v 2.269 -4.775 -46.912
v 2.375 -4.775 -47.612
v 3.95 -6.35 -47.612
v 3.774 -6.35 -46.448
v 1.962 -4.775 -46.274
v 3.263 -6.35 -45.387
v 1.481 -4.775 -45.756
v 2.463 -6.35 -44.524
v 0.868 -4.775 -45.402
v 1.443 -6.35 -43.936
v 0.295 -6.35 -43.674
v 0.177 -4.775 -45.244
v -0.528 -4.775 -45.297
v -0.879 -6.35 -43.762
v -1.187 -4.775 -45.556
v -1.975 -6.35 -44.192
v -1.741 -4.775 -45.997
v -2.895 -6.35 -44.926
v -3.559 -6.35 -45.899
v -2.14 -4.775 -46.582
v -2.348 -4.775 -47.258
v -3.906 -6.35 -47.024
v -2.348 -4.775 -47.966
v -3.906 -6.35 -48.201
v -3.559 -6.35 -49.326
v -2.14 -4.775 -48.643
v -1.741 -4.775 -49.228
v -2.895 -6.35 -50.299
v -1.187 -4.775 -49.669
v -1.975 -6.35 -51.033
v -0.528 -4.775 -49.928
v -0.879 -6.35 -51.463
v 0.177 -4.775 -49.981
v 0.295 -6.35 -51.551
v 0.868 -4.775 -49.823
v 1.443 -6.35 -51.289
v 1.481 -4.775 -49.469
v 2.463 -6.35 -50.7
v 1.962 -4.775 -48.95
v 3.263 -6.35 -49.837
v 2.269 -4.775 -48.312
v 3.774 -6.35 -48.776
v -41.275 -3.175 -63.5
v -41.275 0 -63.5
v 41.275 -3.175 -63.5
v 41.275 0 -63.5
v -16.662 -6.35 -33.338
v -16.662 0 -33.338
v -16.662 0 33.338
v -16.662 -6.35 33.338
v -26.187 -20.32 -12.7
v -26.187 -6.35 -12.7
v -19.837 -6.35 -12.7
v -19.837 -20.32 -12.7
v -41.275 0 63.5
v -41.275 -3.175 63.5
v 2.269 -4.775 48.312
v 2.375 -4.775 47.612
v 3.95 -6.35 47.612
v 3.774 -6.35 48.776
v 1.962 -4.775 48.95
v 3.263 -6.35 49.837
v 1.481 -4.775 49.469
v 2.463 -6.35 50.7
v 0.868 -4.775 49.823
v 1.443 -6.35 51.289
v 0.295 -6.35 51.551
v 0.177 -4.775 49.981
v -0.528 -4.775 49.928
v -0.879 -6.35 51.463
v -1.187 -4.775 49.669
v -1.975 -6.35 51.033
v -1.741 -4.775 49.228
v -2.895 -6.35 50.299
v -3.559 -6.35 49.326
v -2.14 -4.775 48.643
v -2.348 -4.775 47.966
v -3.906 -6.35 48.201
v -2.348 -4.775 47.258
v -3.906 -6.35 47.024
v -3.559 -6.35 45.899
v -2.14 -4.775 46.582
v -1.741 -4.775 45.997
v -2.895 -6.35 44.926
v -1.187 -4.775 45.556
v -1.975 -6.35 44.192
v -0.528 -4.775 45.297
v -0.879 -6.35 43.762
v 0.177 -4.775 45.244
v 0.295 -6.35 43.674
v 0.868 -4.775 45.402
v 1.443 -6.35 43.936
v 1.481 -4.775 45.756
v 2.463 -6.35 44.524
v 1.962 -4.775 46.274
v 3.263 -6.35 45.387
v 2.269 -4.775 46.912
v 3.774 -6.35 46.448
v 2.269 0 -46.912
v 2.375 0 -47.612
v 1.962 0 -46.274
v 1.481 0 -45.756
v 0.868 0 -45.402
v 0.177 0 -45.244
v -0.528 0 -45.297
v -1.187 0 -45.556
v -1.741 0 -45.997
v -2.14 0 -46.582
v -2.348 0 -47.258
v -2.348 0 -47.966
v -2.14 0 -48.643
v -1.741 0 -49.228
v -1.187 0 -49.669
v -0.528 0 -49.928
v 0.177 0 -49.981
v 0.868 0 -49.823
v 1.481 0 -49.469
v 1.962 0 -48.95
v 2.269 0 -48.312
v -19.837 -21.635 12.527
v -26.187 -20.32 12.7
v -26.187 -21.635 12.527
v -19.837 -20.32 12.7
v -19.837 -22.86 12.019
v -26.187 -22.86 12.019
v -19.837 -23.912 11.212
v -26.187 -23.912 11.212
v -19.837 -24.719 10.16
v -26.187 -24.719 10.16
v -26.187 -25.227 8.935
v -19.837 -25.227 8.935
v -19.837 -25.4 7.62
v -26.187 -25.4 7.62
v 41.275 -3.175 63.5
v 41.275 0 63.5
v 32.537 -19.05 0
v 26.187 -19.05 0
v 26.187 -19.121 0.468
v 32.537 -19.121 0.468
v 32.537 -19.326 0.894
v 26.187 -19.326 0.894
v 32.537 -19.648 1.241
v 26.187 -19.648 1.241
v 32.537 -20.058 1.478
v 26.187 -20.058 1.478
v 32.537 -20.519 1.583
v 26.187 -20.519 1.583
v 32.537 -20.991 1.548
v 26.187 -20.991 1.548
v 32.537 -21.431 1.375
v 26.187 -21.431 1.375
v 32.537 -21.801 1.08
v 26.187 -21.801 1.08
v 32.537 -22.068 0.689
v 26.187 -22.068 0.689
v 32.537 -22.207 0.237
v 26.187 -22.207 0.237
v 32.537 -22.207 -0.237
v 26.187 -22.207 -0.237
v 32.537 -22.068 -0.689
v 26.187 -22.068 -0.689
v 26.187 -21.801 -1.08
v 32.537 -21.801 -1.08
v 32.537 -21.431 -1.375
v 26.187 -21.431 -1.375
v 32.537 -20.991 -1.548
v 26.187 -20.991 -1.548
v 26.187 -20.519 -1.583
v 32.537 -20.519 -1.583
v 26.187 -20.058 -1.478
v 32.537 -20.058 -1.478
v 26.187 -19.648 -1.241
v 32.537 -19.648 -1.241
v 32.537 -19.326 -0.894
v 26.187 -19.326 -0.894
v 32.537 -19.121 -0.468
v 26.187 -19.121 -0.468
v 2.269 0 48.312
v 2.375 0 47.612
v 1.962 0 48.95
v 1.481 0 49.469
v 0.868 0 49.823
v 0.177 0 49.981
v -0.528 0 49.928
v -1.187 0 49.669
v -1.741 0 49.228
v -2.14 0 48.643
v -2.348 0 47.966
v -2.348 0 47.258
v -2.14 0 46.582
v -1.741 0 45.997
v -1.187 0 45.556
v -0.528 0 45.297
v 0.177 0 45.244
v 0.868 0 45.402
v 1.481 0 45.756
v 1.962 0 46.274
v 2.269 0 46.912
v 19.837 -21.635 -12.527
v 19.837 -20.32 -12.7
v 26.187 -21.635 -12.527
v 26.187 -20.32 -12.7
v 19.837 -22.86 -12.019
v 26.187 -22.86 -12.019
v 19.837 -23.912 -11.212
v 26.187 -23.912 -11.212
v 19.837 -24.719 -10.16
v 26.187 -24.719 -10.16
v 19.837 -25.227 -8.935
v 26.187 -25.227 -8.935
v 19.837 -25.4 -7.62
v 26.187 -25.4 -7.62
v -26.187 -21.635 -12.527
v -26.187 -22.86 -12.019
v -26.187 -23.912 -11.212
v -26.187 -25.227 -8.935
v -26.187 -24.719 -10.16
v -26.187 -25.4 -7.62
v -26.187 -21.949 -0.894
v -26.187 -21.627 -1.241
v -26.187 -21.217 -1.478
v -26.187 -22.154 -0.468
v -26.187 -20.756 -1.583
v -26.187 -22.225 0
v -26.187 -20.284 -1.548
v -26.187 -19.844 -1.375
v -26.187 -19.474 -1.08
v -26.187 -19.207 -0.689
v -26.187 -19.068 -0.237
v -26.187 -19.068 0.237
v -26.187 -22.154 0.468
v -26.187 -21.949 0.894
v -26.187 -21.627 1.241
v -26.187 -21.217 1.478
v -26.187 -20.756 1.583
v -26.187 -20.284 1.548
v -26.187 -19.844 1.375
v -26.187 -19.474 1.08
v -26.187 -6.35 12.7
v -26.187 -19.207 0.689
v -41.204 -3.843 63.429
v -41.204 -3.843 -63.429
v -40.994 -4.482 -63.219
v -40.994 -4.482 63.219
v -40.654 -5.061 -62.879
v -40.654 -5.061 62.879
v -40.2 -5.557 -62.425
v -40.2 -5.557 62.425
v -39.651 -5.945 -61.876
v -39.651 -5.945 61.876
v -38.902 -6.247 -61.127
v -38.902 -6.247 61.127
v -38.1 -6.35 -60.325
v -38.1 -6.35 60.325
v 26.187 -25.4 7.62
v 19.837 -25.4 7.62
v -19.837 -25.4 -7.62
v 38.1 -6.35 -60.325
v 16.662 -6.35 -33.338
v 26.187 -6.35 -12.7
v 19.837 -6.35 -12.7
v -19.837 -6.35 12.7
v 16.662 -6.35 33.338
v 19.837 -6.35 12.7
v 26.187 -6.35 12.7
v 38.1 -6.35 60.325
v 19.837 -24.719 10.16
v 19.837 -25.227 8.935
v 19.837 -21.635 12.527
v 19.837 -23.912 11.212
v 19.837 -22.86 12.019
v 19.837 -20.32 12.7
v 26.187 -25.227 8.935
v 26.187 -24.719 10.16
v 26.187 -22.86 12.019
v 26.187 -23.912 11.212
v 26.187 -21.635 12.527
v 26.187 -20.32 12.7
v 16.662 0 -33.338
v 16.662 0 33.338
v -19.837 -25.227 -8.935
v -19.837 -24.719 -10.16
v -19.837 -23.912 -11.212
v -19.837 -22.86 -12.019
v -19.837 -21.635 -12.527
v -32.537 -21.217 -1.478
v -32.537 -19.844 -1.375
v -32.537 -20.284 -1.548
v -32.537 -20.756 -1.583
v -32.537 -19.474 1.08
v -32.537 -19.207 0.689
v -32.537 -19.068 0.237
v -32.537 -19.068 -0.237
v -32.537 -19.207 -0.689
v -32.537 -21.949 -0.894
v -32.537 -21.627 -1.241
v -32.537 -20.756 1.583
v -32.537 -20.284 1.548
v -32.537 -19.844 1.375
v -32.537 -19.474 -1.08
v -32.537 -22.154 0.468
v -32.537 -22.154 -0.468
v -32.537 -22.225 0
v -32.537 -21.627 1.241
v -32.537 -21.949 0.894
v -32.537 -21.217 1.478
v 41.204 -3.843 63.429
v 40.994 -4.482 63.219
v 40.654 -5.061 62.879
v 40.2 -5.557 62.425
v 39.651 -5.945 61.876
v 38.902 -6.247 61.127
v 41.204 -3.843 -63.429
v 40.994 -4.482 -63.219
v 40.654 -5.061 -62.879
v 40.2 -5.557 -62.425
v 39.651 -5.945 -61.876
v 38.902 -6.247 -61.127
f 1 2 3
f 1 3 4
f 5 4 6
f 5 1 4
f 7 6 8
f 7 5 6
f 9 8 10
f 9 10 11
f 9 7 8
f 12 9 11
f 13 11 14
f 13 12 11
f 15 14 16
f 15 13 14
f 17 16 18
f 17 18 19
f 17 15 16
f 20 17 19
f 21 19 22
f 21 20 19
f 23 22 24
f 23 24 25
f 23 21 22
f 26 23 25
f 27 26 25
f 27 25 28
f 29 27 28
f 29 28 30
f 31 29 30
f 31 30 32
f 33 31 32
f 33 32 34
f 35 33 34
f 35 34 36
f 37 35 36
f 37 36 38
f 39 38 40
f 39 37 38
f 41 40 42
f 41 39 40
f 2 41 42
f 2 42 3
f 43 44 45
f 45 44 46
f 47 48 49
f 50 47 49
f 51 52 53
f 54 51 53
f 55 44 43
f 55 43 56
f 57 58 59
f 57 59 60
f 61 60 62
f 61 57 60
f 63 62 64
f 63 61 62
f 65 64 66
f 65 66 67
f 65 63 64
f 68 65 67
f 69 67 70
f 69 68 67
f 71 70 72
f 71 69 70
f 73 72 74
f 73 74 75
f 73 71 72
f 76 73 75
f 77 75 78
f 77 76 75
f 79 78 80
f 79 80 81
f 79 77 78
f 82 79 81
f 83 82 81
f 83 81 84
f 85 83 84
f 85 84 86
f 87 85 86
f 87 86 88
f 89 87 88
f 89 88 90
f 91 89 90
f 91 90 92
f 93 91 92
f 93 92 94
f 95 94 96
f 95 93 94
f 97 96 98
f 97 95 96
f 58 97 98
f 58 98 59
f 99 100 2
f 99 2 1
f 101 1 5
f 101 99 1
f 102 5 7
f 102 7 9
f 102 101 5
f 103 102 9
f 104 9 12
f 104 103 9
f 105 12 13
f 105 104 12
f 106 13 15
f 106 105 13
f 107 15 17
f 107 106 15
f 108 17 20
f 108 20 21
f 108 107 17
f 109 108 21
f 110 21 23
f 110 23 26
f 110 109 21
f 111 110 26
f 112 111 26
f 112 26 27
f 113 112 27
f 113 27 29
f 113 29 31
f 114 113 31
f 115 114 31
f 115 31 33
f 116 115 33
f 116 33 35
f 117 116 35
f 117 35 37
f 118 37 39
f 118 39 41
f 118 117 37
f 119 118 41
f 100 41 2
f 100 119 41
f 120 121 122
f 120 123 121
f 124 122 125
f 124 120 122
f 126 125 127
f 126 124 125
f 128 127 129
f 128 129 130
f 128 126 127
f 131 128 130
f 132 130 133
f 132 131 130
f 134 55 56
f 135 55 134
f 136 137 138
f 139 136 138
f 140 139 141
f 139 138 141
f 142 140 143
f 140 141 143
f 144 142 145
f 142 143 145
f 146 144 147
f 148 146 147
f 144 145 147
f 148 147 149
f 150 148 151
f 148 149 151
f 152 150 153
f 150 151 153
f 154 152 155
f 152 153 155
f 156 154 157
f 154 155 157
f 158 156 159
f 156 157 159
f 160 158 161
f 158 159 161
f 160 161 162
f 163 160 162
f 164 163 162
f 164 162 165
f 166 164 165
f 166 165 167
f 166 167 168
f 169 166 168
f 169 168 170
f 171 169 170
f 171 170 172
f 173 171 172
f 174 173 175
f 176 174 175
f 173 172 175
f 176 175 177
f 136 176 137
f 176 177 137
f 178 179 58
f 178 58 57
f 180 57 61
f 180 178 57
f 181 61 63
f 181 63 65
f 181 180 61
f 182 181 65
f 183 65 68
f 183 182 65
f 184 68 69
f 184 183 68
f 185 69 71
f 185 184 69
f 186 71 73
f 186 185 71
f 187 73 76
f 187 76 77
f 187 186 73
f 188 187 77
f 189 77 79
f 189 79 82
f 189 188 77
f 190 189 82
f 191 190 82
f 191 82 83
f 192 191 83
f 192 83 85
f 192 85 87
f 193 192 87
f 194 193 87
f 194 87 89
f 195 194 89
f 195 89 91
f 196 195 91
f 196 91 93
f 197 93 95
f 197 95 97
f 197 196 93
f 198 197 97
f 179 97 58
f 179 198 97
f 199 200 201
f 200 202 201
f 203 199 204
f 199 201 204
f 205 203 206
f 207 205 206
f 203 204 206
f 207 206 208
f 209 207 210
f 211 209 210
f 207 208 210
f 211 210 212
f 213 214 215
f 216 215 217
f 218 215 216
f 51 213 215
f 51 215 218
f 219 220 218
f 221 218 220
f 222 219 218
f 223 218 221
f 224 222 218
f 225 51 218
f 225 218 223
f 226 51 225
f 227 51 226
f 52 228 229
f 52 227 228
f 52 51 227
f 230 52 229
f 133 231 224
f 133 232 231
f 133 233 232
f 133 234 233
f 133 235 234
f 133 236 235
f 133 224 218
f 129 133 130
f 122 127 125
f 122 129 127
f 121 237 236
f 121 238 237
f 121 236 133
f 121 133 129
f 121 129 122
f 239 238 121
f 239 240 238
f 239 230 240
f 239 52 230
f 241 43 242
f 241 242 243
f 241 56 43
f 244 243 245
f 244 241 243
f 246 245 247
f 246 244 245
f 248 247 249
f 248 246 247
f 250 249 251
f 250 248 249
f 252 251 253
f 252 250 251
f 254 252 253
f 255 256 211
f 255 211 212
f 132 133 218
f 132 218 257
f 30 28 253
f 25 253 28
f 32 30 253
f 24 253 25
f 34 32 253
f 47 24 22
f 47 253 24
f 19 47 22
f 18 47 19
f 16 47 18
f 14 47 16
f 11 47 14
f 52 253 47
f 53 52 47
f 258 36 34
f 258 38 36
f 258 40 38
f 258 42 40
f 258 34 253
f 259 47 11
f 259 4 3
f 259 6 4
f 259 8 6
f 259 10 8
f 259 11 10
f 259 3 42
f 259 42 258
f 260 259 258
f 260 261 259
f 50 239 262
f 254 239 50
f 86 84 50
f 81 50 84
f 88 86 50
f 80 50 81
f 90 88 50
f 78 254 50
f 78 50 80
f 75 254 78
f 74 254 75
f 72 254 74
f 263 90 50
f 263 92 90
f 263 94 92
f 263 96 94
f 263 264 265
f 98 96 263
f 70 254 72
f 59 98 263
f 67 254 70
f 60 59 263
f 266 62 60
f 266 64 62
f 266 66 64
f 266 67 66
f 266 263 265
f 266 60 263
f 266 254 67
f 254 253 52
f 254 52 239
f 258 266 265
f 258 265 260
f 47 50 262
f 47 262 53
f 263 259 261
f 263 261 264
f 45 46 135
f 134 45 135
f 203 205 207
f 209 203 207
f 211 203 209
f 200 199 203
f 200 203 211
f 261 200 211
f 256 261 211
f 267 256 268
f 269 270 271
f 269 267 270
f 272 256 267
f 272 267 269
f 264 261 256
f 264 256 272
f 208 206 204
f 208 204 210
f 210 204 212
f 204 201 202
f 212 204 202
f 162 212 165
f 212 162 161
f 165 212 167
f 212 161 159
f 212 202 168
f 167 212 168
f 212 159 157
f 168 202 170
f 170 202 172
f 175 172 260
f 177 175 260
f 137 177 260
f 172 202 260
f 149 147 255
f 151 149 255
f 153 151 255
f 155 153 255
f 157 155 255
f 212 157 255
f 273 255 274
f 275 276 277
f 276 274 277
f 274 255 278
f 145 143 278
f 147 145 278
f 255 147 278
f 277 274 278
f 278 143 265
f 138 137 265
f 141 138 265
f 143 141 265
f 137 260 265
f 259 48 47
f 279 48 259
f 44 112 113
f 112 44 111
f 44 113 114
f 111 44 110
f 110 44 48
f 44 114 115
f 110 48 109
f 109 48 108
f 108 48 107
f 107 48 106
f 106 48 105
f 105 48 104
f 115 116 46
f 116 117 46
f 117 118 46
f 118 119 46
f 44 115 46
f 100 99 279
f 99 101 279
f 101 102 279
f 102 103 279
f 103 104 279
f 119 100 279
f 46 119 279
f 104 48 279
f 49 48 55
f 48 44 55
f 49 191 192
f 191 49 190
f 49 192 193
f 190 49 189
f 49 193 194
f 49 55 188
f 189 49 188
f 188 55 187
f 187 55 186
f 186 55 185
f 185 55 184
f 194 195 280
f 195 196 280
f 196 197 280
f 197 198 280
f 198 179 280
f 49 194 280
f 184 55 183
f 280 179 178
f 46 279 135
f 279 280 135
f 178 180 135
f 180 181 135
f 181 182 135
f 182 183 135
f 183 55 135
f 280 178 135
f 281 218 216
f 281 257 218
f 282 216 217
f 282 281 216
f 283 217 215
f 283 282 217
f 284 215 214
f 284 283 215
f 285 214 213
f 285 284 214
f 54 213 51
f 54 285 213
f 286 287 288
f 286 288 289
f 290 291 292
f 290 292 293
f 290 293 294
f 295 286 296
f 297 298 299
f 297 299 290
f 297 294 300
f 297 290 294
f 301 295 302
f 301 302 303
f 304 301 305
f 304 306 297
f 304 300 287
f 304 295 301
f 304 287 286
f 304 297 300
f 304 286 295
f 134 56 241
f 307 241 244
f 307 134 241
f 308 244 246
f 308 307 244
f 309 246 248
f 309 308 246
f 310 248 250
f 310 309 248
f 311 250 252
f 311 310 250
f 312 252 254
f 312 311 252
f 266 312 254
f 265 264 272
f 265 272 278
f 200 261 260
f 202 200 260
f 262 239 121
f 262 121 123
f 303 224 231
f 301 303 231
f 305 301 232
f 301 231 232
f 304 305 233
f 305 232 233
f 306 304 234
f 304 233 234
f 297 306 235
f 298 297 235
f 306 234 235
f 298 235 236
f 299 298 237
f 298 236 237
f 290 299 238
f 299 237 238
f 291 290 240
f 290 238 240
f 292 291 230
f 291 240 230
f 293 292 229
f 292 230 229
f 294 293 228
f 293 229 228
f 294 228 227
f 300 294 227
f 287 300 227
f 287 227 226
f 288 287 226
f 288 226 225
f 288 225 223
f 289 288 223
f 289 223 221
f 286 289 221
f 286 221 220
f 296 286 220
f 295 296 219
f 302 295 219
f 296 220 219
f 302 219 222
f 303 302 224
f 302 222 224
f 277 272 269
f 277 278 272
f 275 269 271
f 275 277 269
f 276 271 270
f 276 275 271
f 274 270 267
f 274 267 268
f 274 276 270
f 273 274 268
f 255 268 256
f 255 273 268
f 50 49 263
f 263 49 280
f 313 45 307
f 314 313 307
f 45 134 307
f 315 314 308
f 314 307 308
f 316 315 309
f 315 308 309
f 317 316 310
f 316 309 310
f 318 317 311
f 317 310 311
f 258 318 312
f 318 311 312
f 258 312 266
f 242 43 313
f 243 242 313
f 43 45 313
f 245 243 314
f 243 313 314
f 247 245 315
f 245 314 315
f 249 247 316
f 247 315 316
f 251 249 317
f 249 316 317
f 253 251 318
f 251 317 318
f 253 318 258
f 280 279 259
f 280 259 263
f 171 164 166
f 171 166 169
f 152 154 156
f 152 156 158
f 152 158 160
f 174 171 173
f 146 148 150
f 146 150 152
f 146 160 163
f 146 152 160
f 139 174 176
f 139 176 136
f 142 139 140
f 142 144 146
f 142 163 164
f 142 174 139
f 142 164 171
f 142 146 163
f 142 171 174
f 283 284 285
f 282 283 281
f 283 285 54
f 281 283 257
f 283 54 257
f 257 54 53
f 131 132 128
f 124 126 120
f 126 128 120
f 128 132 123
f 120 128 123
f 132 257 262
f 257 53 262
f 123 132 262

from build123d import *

# Parameters (mm, degrees)
F0_W      = 82.55
F0_H      = 127
F0_R      = 2.3749
F0_W_2    = 6.35
F0_H_2    = 25.4
F0_W_3    = 33.3248
F0_H_3    = 66.675
F1_DEPTH  = 6.35
F2_R      = 3.175
F3_SIZE   = 1.5748
F4_SIZE   = 1.5748
F5_DEPTH  = 25.4
F6_DEPTH  = 25.4
F7_R      = 5.08
F8_R      = 5.08
F9_R      = 5.08
F10_R     = 1.5875
F11_DEPTH = 6.35
F12_R     = 1.5875
F13_DEPTH = 6.35


with BuildPart() as f1:
    # F0 (on Front) → F1 (new body)
    with BuildSketch(Plane.XZ):
        Rectangle(F0_W, F0_H)
        with Locations((0, -47.6123)):
            Circle(F0_R, mode=Mode.SUBTRACT)
        with Locations((-23.0124, 0)):
            Rectangle(F0_W_2, F0_H_2, mode=Mode.SUBTRACT)
        Rectangle(F0_W_3, F0_H_3, mode=Mode.SUBTRACT)
        with Locations((23.0124, 0)):
            Rectangle(F0_W_2, F0_H_2, mode=Mode.SUBTRACT)
        with Locations((0, 47.6123)):
            Circle(F0_R, mode=Mode.SUBTRACT)
    extrude(amount=F1_DEPTH)

    # F2
    f2_edges = [f1.edges().sort_by_distance(p)[0] for p in [
        (0, -6.35, 63.5),
        (41.275, -6.35, 0),
        (0, -6.35, -63.5),
        (-41.275, -6.35, 0),
    ]]
    fillet(f2_edges, radius=F2_R)

    # F3
    f3_edges = [f1.edges().sort_by_distance(p)[0] for p in [
        (-2.3749, -6.35, 47.6123),
    ]]
    chamfer(f3_edges, length=F3_SIZE)

    # F4
    f4_edges = [f1.edges().sort_by_distance(p)[0] for p in [
        (-2.3749, -6.35, -47.6123),
    ]]
    chamfer(f4_edges, length=F4_SIZE)

    # F0 (on Front) → F5 (join)
    with BuildSketch(Plane.XZ):
        with Locations((-23.0124, 0)):
            Rectangle(F0_W_2, F0_H_2)
    extrude(amount=F5_DEPTH)

    # F0 (on Front) → F6 (join)
    with BuildSketch(Plane.XZ):
        with Locations((23.0124, 0)):
            Rectangle(F0_W_2, F0_H_2)
    extrude(amount=F6_DEPTH)

    # F7
    f7_edges = [f1.edges().sort_by_distance(p)[0] for p in [
        (-23.0124, -25.4, 12.7),
    ]]
    fillet(f7_edges, radius=F7_R)

    # F8
    f8_edges = [f1.edges().sort_by_distance(p)[0] for p in [
        (23.0124, -25.4, 12.7),
        (-23.0124, -25.4, -12.7),
    ]]
    fillet(f8_edges, radius=F8_R)

    # F9
    f9_edges = [f1.edges().sort_by_distance(p)[0] for p in [
        (23.0124, -25.4, -12.7),
    ]]
    fillet(f9_edges, radius=F9_R)

    # F10 (on face) → F11 (join)
    with BuildSketch(Plane(origin=(-26.1874, 0, 0), x_dir=(0, -1, 0), z_dir=(-1, 0, 0))):
        with Locations((20.6375, 0)):
            Circle(F10_R)
    extrude(amount=F11_DEPTH)

    # F12 (on face) → F13 (join)
    with BuildSketch(Plane.YZ.offset(26.1874)):
        with Locations((-20.6375, 0)):
            Circle(F12_R)
    extrude(amount=F13_DEPTH)


solid = f1.part
